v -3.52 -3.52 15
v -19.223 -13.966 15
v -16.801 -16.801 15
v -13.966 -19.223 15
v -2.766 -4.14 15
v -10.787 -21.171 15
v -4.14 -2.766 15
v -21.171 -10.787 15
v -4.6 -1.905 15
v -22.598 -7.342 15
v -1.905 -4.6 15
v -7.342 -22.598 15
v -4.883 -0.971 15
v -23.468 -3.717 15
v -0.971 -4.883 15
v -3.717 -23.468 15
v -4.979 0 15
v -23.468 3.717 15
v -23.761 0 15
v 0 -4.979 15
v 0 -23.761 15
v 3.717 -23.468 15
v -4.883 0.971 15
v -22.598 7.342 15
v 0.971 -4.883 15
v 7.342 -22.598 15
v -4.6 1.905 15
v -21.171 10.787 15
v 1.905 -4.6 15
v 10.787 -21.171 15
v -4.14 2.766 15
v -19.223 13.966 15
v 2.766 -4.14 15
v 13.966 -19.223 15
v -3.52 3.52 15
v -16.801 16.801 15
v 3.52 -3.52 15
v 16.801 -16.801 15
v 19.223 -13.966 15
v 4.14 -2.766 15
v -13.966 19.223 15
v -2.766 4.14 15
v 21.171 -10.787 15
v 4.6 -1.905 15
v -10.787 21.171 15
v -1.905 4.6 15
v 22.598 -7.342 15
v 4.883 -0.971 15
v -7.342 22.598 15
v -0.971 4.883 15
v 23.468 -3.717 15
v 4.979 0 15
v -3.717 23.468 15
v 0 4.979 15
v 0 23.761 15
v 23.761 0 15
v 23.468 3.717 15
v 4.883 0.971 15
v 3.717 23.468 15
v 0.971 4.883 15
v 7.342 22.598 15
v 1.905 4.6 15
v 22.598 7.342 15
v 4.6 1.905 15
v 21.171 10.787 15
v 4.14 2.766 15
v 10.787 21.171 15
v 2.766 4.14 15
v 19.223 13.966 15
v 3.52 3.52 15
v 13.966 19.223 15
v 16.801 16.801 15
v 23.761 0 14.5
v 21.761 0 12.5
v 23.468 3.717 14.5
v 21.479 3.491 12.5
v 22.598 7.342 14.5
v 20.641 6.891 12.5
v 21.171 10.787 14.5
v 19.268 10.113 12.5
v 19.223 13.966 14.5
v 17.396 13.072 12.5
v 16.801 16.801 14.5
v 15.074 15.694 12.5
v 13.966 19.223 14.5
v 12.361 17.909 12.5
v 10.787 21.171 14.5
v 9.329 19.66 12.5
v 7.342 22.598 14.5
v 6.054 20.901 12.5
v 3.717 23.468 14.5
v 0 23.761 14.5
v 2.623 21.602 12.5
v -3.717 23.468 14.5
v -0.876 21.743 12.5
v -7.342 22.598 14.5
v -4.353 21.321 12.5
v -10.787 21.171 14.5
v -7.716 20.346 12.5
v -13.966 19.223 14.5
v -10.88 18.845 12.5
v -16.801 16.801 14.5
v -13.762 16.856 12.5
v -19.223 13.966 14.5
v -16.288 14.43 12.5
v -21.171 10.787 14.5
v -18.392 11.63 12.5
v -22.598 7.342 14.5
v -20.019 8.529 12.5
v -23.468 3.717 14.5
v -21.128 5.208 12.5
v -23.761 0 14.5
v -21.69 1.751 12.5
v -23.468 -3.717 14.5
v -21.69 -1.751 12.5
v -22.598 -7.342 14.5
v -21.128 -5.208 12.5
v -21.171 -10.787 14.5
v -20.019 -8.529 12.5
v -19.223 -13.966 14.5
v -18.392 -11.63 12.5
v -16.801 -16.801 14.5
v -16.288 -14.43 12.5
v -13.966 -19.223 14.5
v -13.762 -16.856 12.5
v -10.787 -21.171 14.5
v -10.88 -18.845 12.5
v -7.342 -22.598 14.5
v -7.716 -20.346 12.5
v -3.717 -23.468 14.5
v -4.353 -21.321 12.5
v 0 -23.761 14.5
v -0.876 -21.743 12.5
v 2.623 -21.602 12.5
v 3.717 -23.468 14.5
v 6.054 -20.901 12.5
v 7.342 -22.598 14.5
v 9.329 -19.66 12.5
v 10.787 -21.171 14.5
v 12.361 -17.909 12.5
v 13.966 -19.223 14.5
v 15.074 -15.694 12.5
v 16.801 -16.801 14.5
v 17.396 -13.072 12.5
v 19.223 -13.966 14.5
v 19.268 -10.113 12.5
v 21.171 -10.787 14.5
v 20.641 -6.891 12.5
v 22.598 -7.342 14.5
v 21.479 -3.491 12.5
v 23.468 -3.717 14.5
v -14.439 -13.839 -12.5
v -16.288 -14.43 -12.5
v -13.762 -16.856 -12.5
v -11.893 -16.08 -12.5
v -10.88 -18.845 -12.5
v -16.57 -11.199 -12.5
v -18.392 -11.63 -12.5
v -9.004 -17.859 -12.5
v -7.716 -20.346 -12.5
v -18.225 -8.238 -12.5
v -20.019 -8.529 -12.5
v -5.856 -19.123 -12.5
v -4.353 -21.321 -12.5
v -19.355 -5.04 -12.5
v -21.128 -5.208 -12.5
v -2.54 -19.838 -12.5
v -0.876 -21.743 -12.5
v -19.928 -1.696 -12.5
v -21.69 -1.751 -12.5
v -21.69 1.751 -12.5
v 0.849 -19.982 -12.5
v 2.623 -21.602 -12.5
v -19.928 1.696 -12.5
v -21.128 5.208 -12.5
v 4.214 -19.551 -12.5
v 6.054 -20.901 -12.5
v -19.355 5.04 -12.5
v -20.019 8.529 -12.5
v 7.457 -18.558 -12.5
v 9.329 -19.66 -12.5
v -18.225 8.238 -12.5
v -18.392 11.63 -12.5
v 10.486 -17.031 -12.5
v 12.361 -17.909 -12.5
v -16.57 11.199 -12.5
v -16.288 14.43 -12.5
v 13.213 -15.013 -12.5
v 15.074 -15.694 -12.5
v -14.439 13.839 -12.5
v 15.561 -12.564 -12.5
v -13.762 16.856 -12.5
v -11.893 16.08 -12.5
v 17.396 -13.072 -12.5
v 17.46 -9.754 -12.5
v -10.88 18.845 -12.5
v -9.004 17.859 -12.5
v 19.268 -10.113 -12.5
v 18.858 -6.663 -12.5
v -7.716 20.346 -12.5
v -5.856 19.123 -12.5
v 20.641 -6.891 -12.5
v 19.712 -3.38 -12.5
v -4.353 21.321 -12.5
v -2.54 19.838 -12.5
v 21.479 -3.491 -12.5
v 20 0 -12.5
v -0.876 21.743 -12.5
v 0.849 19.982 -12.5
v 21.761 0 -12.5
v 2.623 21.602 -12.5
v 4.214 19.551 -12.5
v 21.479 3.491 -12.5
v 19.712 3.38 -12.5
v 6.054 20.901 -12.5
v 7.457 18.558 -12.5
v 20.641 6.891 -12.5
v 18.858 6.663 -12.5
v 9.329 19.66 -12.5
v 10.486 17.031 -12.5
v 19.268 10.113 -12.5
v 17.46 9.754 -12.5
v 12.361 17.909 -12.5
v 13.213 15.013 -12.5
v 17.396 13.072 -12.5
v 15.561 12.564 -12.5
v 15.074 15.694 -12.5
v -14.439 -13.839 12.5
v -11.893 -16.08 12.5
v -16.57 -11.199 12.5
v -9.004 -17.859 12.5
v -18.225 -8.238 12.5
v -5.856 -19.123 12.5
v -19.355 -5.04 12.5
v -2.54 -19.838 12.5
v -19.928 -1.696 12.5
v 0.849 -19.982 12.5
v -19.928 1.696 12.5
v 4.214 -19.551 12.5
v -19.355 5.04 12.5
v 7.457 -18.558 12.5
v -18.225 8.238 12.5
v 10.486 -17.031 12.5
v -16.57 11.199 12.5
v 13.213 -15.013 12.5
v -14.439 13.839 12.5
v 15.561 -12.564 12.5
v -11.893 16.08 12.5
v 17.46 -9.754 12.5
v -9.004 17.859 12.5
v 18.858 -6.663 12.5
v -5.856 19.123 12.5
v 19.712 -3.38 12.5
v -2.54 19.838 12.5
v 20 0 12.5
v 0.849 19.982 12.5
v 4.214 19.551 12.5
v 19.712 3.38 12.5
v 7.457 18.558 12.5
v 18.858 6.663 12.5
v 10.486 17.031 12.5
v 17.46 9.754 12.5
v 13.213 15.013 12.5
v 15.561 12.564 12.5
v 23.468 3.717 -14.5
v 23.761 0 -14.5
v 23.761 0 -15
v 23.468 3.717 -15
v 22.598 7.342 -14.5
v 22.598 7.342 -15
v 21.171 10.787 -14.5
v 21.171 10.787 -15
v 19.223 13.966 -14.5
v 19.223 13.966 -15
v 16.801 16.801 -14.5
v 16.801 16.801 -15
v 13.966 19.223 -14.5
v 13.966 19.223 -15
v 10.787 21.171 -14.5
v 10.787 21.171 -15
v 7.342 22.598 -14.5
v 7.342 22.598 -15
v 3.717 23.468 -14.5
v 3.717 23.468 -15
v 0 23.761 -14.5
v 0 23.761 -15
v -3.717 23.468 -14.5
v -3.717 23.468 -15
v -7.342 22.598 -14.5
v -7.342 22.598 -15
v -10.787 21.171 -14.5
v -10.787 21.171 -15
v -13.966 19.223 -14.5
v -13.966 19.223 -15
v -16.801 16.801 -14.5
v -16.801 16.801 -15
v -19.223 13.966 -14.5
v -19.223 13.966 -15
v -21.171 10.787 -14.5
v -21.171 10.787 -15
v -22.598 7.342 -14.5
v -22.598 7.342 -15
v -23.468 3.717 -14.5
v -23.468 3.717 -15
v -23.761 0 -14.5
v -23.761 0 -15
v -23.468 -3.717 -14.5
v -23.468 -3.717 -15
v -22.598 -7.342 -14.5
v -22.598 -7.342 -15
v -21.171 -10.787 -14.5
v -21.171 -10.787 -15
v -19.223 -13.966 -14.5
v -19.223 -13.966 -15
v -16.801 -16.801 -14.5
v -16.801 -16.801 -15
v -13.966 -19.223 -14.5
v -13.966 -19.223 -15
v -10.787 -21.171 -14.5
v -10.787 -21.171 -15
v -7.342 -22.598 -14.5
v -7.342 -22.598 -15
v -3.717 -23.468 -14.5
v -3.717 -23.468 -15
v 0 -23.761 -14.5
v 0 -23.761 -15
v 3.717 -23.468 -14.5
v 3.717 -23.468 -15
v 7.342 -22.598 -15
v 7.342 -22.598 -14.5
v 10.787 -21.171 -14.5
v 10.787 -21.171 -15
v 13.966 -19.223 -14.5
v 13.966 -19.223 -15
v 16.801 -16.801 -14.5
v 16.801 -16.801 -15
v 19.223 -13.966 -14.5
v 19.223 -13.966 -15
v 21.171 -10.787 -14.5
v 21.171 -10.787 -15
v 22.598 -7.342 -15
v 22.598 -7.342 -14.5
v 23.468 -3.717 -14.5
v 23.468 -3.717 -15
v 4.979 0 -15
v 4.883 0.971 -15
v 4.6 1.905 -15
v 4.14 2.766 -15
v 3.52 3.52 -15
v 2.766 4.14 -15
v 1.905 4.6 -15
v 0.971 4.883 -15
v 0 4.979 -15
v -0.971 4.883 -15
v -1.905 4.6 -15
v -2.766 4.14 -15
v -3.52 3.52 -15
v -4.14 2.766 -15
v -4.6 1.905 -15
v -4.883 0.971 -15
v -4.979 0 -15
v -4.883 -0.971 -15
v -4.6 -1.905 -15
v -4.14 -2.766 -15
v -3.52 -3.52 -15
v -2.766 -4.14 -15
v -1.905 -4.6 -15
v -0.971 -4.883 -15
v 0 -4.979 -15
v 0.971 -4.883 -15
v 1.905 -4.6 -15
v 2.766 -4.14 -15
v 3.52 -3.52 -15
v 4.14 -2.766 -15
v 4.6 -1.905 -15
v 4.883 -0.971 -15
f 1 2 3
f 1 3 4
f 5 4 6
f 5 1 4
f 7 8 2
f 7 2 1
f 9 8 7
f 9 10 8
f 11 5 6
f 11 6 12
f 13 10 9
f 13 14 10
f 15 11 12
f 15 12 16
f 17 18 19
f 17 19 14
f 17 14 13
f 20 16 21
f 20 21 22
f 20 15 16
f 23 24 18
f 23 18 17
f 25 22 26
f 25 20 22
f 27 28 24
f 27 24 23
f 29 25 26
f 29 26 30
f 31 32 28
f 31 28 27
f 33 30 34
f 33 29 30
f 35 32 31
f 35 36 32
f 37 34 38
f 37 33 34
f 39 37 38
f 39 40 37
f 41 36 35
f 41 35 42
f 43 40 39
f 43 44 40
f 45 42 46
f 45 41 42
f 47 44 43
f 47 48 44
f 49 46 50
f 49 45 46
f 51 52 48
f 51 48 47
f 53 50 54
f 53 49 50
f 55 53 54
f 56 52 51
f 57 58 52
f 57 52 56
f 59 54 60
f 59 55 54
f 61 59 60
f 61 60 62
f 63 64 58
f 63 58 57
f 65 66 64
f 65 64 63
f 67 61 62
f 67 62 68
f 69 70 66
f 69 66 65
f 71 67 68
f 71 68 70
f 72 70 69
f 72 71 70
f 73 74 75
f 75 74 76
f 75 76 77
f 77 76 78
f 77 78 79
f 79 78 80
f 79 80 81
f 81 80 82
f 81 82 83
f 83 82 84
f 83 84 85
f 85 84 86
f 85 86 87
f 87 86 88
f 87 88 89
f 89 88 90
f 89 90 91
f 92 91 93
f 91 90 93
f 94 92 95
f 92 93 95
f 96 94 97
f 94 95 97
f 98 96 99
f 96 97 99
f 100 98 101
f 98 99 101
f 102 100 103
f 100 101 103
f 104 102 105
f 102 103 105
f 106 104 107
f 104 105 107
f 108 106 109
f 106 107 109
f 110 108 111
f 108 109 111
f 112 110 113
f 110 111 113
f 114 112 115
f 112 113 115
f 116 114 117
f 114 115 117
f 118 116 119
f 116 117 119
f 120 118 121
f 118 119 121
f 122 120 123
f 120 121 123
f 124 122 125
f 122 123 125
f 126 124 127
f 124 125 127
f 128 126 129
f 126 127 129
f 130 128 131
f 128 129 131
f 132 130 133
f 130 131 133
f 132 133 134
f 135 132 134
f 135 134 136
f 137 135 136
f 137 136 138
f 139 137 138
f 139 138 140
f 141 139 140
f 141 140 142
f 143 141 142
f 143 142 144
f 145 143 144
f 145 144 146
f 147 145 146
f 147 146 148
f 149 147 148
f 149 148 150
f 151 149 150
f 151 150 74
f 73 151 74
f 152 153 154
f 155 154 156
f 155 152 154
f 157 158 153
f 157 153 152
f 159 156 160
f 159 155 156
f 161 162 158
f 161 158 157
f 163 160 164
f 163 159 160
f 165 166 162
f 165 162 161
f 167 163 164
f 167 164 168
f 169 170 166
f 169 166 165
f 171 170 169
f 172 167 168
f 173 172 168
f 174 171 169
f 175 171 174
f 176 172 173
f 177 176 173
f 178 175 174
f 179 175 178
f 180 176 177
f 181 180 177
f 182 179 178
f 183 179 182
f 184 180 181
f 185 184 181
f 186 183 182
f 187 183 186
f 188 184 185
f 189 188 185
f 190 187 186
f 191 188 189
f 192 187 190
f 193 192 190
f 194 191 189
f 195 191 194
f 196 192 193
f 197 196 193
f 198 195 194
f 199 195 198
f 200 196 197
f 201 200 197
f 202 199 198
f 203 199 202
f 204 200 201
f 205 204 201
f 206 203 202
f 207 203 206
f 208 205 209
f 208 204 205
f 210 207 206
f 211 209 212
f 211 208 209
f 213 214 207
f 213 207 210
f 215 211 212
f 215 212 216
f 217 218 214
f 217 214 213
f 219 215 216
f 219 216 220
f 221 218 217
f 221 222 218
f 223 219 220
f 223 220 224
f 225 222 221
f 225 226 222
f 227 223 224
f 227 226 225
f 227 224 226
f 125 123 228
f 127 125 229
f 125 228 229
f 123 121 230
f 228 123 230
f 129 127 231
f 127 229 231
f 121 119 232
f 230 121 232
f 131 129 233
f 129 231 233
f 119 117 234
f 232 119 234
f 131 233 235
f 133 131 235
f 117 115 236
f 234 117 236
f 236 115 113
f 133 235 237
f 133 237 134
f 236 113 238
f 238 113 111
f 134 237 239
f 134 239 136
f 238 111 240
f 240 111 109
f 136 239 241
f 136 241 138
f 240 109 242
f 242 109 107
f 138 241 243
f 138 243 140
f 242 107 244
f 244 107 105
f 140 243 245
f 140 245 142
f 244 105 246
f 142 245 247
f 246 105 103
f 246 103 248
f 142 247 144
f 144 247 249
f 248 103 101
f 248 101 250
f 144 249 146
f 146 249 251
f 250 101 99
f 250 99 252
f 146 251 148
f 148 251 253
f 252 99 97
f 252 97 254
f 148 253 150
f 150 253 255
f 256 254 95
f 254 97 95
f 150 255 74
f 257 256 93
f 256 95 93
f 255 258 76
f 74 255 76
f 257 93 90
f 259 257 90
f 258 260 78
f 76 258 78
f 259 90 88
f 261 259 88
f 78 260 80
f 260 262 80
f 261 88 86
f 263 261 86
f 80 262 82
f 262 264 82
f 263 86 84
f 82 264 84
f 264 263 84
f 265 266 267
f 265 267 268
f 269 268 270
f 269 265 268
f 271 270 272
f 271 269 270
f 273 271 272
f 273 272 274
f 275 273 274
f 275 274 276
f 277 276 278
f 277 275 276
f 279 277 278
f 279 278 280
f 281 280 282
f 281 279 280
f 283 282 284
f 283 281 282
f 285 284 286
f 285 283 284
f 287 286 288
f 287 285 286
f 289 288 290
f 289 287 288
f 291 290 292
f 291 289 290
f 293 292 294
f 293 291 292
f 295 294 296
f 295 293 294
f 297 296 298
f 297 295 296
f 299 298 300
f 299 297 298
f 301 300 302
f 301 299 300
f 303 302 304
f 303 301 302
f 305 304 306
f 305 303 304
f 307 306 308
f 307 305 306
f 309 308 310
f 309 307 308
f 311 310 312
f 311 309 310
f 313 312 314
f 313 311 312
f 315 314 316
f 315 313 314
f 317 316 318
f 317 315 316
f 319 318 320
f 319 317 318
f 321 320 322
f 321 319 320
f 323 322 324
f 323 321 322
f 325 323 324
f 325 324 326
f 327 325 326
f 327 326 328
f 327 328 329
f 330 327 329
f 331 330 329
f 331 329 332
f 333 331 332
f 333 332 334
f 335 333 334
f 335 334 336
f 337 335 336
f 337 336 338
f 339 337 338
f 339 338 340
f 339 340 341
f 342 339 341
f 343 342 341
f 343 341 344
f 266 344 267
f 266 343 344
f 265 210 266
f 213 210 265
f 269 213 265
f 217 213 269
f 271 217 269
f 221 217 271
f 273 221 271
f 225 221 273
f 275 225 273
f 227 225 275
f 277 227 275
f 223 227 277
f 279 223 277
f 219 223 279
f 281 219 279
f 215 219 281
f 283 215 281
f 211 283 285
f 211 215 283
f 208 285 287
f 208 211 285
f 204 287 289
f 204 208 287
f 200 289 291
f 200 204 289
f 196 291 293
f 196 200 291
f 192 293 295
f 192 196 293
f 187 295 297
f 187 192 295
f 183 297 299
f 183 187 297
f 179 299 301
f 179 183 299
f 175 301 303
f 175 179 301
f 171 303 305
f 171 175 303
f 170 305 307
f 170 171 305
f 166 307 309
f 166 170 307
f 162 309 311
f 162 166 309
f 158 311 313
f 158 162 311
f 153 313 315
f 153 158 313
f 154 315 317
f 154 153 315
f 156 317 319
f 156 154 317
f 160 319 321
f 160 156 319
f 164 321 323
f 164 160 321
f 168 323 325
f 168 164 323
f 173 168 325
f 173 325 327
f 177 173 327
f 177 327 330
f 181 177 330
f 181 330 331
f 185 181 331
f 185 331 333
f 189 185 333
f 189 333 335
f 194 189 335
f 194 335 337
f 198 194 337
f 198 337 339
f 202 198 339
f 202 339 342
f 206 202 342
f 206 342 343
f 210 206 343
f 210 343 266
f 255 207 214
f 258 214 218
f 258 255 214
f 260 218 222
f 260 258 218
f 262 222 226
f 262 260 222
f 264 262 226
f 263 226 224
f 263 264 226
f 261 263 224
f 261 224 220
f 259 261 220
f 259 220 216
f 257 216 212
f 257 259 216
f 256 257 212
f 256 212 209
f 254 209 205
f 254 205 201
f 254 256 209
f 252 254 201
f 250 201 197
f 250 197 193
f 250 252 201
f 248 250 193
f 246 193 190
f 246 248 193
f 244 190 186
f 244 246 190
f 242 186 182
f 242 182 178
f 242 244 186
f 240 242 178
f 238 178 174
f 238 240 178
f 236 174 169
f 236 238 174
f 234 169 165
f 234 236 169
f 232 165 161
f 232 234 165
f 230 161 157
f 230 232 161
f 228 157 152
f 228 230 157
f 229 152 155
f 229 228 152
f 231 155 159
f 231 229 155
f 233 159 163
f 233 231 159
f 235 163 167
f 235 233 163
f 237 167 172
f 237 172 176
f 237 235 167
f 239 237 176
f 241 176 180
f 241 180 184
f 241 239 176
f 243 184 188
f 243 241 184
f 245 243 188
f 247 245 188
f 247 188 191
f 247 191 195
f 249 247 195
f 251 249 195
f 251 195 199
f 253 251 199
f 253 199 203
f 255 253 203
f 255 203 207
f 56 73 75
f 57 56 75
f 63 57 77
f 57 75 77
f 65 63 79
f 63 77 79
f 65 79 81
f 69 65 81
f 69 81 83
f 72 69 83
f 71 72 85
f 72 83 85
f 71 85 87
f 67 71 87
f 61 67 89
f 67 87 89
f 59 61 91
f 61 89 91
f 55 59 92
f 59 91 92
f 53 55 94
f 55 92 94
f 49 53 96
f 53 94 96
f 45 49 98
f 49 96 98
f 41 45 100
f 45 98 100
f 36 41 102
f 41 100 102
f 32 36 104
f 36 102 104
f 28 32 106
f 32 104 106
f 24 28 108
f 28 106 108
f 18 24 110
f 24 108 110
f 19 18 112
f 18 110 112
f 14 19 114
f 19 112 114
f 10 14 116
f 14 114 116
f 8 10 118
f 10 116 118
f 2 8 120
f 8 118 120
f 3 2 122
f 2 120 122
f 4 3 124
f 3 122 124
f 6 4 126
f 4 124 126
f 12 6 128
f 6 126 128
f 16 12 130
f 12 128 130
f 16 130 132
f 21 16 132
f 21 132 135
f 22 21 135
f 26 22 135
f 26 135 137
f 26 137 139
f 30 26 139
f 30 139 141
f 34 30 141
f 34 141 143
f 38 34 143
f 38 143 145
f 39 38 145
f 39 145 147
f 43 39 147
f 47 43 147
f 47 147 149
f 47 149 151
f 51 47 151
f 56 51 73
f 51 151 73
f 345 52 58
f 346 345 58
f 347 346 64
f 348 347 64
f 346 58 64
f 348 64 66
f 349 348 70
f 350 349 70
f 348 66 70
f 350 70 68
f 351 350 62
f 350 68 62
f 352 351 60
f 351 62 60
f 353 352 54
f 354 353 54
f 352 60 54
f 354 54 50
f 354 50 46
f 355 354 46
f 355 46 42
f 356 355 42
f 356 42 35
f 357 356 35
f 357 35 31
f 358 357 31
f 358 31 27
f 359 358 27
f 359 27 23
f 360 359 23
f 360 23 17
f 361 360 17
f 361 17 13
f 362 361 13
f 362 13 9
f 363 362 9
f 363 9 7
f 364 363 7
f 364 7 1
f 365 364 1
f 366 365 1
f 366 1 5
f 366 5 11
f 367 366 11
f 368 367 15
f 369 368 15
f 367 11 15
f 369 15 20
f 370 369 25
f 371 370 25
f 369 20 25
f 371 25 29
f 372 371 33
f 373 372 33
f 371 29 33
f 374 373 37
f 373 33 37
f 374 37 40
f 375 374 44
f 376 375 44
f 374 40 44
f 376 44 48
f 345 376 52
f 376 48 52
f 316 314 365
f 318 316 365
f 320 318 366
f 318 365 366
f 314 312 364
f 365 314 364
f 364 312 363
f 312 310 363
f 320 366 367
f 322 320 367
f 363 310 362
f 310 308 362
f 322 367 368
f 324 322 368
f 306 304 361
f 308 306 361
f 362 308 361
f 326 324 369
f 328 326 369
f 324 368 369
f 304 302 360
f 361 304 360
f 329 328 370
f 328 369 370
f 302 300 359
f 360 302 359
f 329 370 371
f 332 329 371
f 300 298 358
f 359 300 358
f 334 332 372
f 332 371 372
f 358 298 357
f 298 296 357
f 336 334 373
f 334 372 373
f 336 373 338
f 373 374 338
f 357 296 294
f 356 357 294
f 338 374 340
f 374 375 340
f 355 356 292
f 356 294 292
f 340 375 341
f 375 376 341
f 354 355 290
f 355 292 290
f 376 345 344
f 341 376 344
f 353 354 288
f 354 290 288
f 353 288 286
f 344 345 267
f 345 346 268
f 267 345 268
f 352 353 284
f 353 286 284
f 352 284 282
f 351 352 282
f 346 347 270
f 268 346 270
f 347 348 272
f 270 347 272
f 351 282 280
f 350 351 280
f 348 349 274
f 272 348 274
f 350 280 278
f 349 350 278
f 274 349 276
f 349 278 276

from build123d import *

# Parameters (mm, degrees)
CROQUIS1_R                 = 20
SALIENTE_EXTRUIR1_DEPTH    = 12.5
CROQUIS2_R                 = 23.760562535
SALIENTE_EXTRUIR2_DEPTH    = 2.5
CHAFL_N1_SIZE              = 2
CHAFL_N1_OF_SIMETR_A1_SIZE = 2
CROQUIS3_R                 = 4.978571234
CORTAR_EXTRUIR1_DEPTH      = 46.045850685


with BuildPart() as part:
    # Croquis1 → Saliente-Extruir1 (new, symmetric)
    with BuildSketch(Plane.XY):
        Circle(CROQUIS1_R)
    extrude(amount=SALIENTE_EXTRUIR1_DEPTH, both=True)

    # Croquis2 → Saliente-Extruir2 (add)
    with BuildSketch(Plane.XY.offset(12.5)):
        Circle(CROQUIS2_R)
    saliente_extruir2 = extrude(amount=SALIENTE_EXTRUIR2_DEPTH)

    # Chaflán1
    chafl_n1_edges = [part.edges().sort_by_distance(p)[0] for p in [
        (-23.760562535, 0, 12.5),
    ]]
    chamfer(chafl_n1_edges, length=CHAFL_N1_SIZE)

    # Simetría1: Saliente-Extruir2 across plane
    add(saliente_extruir2.mirror(Plane.XY))

    # Chaflán1 of Simetría1
    chafl_n1_of_simetr_a1_edges = [part.edges().sort_by_distance(p)[0] for p in [
        (-23.760562535, 0, -12.5),
    ]]
    chamfer(chafl_n1_of_simetr_a1_edges, length=CHAFL_N1_OF_SIMETR_A1_SIZE)

    # Croquis3 → Cortar-Extruir1 (cut, through all)
    with BuildSketch(Plane.XY.offset(15)):
        Circle(CROQUIS3_R)
    extrude(amount=-CORTAR_EXTRUIR1_DEPTH, mode=Mode.SUBTRACT)


solid = part.part
